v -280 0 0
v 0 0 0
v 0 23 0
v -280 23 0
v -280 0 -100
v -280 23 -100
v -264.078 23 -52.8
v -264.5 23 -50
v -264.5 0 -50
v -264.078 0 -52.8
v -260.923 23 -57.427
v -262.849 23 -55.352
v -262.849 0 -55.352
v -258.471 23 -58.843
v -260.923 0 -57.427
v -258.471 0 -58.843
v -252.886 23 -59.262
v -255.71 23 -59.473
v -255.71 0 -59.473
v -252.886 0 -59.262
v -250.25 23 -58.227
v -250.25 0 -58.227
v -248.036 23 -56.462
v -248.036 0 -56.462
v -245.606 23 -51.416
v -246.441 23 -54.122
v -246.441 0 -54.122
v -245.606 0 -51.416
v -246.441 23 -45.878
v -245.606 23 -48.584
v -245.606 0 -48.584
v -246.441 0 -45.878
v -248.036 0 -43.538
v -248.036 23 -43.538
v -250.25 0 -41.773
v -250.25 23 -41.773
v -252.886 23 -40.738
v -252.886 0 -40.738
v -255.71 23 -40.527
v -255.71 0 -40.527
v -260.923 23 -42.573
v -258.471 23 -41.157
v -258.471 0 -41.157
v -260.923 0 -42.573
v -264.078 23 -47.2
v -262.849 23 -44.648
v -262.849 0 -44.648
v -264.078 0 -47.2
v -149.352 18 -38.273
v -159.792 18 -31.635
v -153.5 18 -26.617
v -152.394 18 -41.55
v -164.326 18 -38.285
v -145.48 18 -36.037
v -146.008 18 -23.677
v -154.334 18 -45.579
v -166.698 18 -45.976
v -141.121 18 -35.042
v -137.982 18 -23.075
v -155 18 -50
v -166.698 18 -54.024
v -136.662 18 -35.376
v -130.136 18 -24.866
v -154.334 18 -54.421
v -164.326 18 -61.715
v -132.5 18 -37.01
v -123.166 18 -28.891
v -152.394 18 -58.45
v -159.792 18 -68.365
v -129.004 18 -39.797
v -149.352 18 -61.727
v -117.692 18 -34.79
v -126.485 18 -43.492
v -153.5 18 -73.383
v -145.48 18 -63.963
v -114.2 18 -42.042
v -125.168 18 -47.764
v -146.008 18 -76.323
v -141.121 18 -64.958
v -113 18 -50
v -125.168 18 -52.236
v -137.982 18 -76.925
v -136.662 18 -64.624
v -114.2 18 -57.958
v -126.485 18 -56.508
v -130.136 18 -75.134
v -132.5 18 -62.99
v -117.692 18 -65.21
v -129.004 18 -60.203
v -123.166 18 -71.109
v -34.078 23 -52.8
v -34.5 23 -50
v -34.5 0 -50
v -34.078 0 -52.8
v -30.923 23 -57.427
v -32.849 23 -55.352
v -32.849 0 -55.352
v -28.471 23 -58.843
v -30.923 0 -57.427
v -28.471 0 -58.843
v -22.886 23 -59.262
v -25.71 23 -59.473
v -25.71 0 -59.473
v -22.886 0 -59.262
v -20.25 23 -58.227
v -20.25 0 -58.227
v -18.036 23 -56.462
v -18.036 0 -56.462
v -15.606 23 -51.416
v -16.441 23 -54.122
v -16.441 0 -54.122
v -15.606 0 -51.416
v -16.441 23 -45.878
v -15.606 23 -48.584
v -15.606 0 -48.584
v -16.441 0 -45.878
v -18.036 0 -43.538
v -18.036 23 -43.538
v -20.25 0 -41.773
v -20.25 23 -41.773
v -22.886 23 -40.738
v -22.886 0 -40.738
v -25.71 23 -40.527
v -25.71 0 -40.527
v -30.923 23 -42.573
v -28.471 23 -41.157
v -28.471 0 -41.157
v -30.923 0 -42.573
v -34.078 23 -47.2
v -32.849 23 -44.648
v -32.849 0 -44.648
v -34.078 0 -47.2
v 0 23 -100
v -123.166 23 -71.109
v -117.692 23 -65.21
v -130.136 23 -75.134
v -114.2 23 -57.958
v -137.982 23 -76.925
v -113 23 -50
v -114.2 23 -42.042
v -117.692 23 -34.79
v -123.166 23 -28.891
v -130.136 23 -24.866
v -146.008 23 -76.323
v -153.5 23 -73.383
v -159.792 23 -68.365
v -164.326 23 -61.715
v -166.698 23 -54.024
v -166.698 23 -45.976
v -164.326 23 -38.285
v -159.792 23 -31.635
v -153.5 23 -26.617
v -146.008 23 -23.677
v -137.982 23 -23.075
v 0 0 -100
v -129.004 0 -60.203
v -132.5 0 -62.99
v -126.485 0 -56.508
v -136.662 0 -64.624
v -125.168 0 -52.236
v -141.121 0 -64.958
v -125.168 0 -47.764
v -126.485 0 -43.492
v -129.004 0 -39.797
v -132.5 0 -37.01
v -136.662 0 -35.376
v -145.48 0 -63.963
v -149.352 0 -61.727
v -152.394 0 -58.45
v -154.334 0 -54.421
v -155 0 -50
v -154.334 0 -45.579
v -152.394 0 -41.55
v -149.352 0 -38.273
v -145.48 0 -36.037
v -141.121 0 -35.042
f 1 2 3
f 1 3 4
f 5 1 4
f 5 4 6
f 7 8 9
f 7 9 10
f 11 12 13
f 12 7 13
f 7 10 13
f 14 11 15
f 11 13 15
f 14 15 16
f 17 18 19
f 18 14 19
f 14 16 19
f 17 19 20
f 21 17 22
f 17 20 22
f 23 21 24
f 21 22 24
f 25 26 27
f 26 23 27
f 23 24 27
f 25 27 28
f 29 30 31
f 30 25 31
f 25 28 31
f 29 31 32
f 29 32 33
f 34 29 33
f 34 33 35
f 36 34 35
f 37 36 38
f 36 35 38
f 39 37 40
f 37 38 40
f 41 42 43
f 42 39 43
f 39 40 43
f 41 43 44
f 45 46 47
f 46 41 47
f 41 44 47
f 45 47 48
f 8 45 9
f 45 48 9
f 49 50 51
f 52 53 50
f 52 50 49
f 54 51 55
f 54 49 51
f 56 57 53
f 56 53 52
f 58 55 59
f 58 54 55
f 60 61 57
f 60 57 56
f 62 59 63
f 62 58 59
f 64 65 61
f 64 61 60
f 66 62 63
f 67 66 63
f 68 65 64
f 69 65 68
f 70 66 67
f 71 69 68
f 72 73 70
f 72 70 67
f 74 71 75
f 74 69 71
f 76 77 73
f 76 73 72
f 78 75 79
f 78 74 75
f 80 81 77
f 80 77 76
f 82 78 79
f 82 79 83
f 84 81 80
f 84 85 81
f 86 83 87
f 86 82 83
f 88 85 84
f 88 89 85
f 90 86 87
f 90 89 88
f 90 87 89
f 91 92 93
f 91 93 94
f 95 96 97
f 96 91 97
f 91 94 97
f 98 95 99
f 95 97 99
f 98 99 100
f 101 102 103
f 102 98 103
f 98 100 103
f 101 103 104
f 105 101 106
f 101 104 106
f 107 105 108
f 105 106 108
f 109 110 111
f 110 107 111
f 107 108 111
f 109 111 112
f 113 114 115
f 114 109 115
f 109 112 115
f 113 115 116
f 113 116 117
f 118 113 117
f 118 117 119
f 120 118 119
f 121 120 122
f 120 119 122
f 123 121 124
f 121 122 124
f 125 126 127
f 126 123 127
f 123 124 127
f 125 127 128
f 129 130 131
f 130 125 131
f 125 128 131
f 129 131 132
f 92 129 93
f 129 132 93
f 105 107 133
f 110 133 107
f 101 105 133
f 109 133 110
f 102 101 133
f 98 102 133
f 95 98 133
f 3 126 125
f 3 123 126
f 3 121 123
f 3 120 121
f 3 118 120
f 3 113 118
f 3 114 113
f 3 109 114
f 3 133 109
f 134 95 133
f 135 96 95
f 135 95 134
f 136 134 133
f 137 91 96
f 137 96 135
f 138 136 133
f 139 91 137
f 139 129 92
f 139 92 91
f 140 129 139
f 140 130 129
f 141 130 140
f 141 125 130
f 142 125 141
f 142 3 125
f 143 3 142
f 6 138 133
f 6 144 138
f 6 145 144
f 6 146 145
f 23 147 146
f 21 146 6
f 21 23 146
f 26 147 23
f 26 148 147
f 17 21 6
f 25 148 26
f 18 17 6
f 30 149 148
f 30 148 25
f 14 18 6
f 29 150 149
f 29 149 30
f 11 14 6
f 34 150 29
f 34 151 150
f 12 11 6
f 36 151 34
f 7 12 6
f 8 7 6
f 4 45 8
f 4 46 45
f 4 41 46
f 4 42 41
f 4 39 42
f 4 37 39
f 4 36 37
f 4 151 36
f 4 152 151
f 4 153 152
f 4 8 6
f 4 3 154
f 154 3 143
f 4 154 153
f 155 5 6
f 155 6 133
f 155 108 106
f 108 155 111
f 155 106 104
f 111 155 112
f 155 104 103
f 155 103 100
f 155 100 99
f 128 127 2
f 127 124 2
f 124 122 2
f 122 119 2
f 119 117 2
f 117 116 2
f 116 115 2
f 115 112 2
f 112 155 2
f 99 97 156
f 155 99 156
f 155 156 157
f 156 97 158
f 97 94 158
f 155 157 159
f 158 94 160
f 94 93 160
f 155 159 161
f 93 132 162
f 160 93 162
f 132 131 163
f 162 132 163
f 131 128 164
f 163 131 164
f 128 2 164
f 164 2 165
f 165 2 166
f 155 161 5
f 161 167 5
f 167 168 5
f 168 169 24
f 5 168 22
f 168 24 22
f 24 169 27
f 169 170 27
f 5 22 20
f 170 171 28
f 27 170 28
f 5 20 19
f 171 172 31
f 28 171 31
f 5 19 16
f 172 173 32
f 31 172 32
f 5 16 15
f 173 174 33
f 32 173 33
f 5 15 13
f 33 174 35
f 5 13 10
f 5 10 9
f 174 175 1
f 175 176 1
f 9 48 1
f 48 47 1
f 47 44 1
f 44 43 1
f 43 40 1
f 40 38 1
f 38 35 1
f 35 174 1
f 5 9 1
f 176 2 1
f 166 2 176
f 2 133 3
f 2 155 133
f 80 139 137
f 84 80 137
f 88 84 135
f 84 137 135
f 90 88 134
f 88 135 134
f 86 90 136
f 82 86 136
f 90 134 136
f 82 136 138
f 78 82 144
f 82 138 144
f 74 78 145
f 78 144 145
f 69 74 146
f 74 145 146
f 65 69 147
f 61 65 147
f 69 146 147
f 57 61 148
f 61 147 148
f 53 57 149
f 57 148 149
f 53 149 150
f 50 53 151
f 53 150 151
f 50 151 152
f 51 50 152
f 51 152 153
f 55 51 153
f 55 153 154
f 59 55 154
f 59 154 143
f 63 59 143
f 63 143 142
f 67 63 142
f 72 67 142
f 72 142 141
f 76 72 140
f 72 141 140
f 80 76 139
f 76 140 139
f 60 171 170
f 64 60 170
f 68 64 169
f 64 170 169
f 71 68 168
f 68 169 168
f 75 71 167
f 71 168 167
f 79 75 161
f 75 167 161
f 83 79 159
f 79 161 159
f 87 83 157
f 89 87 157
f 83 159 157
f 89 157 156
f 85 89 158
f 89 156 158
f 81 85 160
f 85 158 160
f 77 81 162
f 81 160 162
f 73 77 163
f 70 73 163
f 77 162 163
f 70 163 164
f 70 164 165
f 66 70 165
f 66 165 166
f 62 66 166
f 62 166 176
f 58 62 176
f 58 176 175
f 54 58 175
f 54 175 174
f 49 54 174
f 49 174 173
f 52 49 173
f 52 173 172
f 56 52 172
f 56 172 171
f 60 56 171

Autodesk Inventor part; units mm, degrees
ref_plane "YZ Plane" through (0, 0, 0) normal (1, 0, 0) x (0, 1, 0)
ref_plane "XZ Plane" through (0, 0, 0) normal (0, 1, 0) x (-1, 0, 0)
ref_plane "XY Plane" through (0, 0, 0) normal (0, 0, 1) x (1, 0, 0)
sketch "Sketch2" plane through (0, 0, 0) normal (0, 1, 0) x (-1, 0, 0)
  line L0 (0, 0) -> (280, 0)
  line L1 (280, 0) -> (280, -100)
  line L2 (280, -100) -> (0, -100)
  line L3 (0, -100) -> (0, 0)
  circle A0 centre (140, -50) radius 15
  circle A1 centre (255, -50) radius 9.5
  circle A2 centre (25, -50) radius 9.5
  dimension "d0" = 280
  dimension "d1" = 100
  dimension "d2" = 30
  dimension "d3" = 19
  dimension "d4" = 19
  dimension "d5" = 115
  dimension "d6" = 115
extrude "Extrusion2" add sketch "Sketch2" along normal blind 23
sketch "Sketch4" plane through (0, 23, 0) normal (0, 1, 0) x (1, 0, 0)
  circle A0 centre (-140, 50) radius 27
  point P0 (0, 0)
  dimension "d11" = 54
extrude "Extrusion3" cut sketch "Sketch4" against normal blind 5
sketch "Sketch5" plane through (0, 23, 0) normal (0, 1, 0) x (1, 0, 0)
  point P0 (0, 0)
properties part number "top plate"
